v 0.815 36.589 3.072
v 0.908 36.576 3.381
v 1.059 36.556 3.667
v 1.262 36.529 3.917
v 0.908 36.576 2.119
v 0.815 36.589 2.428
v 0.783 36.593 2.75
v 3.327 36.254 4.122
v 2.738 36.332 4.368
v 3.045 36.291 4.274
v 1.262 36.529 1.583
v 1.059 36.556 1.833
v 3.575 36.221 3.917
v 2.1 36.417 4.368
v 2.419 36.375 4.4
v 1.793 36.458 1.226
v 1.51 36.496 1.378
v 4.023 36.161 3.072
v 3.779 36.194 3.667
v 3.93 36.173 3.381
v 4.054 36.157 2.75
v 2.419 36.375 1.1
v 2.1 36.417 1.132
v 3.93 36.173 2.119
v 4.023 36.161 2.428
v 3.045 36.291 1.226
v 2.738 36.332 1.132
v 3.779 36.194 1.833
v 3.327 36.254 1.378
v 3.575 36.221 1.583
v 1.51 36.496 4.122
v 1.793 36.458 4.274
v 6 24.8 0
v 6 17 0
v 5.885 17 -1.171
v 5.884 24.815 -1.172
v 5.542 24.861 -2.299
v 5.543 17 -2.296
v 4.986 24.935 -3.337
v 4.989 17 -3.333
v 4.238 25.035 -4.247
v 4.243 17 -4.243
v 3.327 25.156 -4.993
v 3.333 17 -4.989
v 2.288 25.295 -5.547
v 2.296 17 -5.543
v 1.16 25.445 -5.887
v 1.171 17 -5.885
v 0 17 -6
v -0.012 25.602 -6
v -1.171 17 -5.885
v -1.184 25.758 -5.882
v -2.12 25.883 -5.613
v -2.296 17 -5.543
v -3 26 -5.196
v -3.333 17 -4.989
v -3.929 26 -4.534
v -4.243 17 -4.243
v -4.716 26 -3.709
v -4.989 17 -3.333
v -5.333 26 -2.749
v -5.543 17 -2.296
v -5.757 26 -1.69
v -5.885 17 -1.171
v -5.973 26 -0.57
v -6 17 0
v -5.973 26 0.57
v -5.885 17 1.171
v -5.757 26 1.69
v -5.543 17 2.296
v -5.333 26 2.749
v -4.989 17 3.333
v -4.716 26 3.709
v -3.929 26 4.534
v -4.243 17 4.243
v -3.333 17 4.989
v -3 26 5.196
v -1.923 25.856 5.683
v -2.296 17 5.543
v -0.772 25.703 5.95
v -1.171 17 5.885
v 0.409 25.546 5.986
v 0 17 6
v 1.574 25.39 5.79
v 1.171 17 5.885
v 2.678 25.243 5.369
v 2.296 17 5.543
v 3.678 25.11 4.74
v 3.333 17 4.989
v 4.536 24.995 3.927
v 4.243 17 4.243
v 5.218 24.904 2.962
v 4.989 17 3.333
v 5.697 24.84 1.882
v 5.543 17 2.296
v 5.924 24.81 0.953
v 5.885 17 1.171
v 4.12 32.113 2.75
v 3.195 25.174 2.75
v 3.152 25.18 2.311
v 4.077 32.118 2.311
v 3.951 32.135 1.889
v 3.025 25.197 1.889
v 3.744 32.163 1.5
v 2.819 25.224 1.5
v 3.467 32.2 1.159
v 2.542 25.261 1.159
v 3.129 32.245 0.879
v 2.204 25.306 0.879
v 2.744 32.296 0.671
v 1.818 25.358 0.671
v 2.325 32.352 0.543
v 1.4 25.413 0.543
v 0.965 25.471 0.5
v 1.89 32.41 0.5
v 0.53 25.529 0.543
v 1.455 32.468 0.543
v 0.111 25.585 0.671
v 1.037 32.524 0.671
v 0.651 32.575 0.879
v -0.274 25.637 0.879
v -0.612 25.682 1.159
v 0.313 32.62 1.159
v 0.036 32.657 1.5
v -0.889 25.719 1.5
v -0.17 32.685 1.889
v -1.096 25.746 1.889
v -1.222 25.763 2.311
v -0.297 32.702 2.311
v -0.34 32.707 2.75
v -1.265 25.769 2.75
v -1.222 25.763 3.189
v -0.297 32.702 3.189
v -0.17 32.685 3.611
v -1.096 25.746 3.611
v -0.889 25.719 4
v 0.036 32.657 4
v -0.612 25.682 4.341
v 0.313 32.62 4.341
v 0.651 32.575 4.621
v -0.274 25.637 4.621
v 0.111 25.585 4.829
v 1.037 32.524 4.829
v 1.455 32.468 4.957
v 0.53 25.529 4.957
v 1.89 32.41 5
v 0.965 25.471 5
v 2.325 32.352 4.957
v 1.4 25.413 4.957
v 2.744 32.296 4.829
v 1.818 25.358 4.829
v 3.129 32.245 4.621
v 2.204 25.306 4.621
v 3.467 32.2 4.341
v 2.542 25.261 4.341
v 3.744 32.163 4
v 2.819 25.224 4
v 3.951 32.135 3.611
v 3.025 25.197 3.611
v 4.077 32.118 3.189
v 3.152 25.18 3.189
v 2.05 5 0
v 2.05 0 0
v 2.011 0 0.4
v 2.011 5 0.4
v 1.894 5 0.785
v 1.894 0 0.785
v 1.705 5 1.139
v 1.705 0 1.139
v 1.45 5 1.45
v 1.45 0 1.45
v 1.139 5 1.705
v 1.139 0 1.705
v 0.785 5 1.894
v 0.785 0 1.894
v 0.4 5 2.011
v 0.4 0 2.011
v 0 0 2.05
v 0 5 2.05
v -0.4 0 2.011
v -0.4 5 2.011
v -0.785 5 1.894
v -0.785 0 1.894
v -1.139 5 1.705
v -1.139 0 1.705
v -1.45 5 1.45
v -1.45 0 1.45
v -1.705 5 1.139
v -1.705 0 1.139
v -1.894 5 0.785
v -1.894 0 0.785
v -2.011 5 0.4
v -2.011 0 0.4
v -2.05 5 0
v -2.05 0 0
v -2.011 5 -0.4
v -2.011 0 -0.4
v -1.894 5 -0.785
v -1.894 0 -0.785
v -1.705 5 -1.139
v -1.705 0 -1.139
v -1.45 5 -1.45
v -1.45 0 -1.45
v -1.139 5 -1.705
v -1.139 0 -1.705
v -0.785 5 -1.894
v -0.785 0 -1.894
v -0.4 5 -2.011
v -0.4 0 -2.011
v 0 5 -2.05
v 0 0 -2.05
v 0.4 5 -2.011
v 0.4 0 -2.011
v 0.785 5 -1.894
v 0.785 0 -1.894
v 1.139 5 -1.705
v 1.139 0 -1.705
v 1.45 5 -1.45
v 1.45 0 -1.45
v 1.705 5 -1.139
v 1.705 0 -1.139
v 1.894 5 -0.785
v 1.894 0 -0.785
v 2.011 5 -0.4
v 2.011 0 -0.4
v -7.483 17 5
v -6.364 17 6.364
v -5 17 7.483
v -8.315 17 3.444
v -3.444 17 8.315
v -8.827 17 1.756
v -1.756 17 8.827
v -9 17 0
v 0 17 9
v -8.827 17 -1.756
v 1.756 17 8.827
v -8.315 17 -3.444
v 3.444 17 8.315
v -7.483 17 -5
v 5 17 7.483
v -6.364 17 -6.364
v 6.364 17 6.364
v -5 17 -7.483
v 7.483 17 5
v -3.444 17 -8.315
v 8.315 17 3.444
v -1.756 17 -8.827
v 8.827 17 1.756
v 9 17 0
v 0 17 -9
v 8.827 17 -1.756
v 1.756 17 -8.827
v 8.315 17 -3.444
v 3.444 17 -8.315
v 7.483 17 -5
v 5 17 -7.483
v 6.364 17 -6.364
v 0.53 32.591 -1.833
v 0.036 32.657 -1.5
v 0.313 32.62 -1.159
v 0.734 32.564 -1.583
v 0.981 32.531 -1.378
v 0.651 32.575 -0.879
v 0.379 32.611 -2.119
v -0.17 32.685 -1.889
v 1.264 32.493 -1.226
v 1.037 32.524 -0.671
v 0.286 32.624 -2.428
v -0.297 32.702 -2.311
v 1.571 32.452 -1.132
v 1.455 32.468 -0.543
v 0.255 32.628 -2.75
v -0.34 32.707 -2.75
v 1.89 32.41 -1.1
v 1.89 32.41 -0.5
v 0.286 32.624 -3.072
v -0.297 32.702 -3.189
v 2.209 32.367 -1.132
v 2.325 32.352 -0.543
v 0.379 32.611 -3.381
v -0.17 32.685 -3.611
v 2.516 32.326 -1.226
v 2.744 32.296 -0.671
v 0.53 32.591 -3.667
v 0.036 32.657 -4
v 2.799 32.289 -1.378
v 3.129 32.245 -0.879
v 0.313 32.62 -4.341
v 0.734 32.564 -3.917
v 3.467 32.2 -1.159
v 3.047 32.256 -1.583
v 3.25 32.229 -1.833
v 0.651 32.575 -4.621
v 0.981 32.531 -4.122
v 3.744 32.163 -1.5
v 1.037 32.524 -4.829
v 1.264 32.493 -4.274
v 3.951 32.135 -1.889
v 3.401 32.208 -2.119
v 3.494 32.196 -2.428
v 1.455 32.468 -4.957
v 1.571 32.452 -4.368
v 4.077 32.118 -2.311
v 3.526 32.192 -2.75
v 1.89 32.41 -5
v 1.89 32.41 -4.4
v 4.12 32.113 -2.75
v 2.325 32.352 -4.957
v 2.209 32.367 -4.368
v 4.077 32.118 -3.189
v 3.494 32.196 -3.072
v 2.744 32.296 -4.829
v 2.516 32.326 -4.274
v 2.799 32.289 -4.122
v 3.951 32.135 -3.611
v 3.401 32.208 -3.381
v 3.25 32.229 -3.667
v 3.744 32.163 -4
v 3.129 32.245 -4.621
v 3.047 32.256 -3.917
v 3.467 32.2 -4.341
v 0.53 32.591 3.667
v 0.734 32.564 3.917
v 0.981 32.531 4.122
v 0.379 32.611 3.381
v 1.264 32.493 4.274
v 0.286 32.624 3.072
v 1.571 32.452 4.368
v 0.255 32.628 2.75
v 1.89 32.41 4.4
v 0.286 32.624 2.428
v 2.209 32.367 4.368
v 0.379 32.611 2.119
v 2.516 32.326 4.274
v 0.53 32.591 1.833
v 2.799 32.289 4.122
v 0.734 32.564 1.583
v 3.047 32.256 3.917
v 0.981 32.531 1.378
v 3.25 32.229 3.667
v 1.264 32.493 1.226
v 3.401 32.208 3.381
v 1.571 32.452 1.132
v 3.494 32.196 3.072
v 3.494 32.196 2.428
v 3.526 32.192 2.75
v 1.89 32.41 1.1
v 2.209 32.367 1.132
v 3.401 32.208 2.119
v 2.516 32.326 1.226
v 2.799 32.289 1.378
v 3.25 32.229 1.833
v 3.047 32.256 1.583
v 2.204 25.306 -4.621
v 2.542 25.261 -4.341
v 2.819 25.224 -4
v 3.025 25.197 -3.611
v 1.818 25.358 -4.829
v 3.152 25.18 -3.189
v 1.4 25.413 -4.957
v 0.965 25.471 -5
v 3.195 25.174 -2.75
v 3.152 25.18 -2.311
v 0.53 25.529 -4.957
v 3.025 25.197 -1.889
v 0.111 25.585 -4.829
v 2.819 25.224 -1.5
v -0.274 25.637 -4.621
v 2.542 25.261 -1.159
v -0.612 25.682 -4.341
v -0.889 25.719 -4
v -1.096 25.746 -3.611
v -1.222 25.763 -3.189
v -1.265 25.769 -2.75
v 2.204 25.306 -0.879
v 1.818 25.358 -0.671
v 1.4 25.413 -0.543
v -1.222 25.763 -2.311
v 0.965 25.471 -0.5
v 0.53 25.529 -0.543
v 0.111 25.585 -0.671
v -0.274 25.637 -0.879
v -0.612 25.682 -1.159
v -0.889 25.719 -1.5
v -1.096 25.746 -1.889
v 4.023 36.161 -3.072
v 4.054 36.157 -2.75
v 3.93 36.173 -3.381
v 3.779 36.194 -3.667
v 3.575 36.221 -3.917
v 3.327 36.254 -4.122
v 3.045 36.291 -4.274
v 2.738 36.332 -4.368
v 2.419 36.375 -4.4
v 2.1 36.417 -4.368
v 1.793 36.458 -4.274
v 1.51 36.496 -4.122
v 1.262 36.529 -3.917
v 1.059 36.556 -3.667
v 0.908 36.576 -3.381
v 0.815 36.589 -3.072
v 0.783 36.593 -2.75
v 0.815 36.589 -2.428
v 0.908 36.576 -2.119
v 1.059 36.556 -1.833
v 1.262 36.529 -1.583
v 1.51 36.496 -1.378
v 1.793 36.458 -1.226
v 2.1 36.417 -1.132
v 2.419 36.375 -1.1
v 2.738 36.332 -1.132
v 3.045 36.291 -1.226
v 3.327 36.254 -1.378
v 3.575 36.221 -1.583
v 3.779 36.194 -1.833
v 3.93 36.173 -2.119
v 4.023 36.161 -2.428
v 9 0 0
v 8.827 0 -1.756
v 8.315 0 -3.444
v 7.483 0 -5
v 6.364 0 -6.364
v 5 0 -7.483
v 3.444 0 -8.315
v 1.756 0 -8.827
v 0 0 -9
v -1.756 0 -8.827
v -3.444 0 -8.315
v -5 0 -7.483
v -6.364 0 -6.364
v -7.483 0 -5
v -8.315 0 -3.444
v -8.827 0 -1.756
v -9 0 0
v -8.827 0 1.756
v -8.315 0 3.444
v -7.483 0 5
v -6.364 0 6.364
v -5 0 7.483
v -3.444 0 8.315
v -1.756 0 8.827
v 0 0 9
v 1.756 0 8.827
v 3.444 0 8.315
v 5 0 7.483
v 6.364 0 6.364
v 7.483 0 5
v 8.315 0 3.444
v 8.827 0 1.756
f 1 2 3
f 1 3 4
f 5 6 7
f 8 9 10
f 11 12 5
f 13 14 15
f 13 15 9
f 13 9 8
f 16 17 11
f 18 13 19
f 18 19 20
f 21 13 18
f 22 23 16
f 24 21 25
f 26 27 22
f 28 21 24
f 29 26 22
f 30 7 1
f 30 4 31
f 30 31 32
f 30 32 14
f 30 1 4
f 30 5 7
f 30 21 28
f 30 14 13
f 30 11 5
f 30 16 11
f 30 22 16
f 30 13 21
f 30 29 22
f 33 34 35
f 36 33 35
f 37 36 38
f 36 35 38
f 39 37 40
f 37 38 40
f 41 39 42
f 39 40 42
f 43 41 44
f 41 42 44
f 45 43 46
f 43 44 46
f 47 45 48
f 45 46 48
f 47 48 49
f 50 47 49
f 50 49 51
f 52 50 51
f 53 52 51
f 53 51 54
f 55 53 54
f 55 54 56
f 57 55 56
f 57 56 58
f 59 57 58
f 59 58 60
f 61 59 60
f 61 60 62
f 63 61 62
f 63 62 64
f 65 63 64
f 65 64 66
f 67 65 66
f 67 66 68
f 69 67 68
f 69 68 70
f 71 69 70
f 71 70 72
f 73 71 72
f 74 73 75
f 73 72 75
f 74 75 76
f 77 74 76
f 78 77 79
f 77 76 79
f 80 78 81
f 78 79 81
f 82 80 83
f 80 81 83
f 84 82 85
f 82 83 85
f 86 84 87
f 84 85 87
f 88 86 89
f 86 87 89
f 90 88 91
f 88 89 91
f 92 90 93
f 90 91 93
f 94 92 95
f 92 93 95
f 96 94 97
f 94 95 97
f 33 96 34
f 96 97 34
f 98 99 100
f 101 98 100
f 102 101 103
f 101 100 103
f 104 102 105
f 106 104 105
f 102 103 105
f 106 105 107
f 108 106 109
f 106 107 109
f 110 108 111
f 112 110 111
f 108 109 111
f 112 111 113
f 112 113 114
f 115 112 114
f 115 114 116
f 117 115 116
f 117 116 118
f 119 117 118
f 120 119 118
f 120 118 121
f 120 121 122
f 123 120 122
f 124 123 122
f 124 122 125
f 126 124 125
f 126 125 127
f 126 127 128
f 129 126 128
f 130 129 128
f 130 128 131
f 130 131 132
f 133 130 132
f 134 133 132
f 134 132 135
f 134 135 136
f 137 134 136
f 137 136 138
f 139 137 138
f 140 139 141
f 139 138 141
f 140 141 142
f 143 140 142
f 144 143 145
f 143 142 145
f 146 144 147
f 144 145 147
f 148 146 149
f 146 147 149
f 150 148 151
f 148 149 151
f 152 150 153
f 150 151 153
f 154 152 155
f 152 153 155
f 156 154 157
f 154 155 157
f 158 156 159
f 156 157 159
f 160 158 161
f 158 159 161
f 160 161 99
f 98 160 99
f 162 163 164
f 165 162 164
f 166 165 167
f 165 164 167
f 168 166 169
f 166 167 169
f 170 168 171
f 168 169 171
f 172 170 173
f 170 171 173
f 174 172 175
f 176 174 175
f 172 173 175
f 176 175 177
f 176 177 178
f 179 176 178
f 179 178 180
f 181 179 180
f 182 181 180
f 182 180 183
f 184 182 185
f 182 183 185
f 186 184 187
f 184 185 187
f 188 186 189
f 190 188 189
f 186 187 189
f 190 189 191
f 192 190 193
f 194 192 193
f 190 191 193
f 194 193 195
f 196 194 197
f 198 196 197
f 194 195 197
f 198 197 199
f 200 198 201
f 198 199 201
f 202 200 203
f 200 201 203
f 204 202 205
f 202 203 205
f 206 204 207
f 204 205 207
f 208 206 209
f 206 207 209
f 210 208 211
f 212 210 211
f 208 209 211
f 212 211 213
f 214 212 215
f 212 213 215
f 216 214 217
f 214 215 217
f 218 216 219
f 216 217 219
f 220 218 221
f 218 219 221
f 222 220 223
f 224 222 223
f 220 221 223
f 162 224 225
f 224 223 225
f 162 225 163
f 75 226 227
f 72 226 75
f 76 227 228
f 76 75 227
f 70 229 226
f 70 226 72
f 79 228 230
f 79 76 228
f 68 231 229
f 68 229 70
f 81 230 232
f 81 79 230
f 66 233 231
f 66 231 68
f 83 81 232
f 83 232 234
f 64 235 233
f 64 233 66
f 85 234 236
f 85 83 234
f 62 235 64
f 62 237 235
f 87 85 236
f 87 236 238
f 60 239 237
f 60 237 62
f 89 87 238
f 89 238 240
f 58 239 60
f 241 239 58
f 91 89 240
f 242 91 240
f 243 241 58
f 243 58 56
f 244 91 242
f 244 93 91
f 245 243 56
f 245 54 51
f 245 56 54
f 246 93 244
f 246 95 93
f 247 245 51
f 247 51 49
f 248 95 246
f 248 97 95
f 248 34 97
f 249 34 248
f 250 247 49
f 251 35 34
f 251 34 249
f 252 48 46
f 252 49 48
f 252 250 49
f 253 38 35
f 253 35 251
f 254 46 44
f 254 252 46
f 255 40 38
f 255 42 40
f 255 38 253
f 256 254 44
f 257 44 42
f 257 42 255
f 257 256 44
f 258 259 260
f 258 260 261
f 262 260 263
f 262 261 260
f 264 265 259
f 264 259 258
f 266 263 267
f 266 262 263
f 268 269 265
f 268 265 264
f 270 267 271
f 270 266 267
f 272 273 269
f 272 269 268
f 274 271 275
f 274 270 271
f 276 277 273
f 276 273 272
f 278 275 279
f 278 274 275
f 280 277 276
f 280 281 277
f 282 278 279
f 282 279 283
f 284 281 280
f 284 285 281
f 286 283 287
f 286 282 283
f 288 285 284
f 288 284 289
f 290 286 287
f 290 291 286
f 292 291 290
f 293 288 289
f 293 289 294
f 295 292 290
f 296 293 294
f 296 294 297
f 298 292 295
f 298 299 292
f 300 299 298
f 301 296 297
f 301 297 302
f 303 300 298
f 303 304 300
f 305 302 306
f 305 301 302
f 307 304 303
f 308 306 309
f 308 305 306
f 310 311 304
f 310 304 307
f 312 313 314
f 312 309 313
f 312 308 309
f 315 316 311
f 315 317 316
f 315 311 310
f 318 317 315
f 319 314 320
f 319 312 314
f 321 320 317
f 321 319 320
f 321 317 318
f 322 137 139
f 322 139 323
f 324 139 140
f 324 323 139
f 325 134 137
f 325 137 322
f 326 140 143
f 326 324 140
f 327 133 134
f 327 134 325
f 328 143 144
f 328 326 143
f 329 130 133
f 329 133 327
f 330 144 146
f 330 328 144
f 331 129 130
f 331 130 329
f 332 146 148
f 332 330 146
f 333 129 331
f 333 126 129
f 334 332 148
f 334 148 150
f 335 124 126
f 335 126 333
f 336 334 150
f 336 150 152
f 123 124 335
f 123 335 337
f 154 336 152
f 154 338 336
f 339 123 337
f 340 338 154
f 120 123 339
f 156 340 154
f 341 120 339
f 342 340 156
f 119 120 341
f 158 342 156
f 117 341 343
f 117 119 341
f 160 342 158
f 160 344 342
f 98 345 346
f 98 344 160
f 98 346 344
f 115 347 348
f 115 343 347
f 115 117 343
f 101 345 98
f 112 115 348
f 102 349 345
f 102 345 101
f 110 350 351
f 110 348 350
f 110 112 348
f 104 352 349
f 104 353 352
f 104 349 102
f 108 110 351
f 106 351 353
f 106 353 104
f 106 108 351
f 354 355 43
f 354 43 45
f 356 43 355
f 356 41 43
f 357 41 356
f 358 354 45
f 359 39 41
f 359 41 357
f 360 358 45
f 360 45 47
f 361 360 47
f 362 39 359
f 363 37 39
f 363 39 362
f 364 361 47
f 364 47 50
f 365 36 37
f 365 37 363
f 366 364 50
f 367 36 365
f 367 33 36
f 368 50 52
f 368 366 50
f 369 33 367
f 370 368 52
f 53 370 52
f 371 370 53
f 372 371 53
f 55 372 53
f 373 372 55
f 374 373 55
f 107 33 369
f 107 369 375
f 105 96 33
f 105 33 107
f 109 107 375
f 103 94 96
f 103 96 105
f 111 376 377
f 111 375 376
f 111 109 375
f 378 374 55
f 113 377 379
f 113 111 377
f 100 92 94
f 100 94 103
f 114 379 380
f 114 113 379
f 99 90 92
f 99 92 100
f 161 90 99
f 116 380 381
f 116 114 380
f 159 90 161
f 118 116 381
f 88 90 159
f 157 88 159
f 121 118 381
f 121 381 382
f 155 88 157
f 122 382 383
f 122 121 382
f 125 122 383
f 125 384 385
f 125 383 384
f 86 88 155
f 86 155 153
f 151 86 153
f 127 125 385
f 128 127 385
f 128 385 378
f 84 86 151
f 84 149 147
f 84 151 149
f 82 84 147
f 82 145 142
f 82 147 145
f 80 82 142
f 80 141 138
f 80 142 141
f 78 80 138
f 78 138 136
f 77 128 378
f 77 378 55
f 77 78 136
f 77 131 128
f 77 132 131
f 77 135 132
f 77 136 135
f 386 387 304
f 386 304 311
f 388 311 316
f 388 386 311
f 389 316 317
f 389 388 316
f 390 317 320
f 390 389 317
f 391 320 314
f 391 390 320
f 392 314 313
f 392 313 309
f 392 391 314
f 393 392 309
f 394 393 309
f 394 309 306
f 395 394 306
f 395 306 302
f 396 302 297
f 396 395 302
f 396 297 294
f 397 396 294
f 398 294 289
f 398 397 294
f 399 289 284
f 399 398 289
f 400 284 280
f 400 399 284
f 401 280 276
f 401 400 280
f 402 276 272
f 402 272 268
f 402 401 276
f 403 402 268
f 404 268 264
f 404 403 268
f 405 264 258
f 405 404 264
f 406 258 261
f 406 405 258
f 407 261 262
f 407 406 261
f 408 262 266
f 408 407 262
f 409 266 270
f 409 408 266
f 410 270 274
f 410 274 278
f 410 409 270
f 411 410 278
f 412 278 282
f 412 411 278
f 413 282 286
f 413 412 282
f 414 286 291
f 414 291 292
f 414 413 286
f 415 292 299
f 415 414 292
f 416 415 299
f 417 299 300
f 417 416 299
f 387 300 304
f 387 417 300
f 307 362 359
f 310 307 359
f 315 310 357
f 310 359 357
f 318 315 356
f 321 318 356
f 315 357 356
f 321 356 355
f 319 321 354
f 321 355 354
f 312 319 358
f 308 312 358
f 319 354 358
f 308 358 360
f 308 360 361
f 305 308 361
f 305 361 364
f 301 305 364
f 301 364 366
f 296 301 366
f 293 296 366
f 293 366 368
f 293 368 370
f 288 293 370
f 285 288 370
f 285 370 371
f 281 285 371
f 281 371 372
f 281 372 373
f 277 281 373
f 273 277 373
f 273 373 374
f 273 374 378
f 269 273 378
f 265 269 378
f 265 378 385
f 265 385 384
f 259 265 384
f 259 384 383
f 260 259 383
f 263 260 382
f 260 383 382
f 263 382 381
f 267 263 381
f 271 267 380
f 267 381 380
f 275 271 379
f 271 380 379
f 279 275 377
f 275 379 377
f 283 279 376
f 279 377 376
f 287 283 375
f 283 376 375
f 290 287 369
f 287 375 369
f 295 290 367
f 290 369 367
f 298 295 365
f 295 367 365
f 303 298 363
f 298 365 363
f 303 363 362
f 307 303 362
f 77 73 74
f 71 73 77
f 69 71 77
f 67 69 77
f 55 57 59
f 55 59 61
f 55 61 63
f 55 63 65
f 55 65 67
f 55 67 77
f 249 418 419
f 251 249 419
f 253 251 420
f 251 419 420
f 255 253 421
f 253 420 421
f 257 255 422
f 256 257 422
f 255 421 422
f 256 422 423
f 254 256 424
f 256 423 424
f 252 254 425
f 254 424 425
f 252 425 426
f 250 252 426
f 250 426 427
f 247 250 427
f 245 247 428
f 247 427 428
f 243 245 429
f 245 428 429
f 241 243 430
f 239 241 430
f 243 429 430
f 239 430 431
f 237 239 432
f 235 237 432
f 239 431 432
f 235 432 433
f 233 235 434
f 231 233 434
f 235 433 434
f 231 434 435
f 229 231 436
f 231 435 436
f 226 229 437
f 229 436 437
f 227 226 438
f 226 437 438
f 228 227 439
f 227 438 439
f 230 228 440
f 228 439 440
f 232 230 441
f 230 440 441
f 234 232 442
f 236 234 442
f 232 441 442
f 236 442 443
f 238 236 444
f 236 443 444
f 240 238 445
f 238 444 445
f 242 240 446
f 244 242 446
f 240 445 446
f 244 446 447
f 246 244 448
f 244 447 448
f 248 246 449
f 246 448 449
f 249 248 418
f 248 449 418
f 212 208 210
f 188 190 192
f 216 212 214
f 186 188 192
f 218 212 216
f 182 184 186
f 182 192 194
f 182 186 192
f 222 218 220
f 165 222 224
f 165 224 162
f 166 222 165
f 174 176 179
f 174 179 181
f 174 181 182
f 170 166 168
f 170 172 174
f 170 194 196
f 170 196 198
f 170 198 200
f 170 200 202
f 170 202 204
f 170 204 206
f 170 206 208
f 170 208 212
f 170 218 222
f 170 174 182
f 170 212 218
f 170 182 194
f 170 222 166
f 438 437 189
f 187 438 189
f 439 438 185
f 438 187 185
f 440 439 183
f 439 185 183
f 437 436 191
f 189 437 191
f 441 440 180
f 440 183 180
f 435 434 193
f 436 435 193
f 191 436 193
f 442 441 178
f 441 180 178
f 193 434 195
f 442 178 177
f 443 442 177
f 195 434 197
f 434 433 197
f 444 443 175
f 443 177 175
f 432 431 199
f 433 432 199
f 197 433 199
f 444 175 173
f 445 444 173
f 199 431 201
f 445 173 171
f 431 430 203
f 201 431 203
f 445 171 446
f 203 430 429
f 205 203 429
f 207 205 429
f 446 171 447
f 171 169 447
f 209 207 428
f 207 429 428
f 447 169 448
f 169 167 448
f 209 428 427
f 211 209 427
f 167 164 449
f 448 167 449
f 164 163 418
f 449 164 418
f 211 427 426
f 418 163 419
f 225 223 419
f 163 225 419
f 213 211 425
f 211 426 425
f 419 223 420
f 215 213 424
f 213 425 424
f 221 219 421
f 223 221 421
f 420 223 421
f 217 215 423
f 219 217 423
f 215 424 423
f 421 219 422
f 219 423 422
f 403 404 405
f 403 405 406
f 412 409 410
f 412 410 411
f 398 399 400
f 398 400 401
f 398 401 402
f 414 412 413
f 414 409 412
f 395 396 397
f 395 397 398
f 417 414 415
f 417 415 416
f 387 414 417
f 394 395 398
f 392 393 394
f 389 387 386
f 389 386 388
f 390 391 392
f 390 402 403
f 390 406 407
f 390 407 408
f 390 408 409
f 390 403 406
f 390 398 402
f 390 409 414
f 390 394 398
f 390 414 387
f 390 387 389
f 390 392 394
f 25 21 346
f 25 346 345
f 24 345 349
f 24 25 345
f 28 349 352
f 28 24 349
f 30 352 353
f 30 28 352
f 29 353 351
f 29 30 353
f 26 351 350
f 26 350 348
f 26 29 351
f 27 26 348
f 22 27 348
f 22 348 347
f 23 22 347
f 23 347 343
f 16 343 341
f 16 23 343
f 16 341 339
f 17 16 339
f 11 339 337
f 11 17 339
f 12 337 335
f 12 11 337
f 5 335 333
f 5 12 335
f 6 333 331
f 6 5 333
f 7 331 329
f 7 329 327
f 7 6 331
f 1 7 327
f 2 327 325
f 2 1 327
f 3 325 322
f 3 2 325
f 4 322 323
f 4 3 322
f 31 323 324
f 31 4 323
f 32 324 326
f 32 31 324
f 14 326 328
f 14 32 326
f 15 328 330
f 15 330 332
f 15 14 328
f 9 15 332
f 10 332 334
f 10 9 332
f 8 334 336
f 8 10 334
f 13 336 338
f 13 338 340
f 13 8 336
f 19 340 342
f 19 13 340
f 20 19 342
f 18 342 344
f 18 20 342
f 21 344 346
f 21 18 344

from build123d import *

# Parameters (mm, degrees)
SKETCH1_R           = 9
BOSS_EXTRUDE1_DEPTH = 17
SKETCH2_R           = 6
BOSS_EXTRUDE2_DEPTH = 9
CUT_EXTRUDE1_DEPTH  = 8.5
SKETCH4_R           = 2.25
BOSS_EXTRUDE3_DEPTH = 11
SKETCH5_R           = 2.25
SKETCH5_R_2         = 1.65
CUT_EXTRUDE2_DEPTH  = 4
SKETCH6_R           = 2.05
CUT_EXTRUDE3_DEPTH  = 5


with BuildPart() as part:
    # Sketch1 → Boss-Extrude1 (new body)
    with BuildSketch(Plane(origin=(0, 0, 0), x_dir=(1, 0, 0), z_dir=(0, 1, 0))):
        Circle(SKETCH1_R)
    extrude(amount=BOSS_EXTRUDE1_DEPTH)

    # Sketch2 → Boss-Extrude2 (add)
    with BuildSketch(Plane(origin=(0, 17, 0), x_dir=(1, 0, 0), z_dir=(0, 1, 0))):
        Circle(SKETCH2_R)
    extrude(amount=BOSS_EXTRUDE2_DEPTH)

    # Sketch3 → Cut-Extrude1 (cut, symmetric)
    with BuildSketch(Plane.XY):
        Polygon((-3, 26), (6, 26), (6, 24.8), align=None)
    extrude(amount=CUT_EXTRUDE1_DEPTH, both=True, mode=Mode.SUBTRACT)

    # Sketch4 → Boss-Extrude3 (add)
    with BuildSketch(Plane(origin=(3.35371179, 25.152838428, 0), x_dir=(0.991227901, -0.13216372, 0), z_dir=(0.13216372, 0.991227901, 0))):
        with Locations((-2.409940424, 2.75)):
            Circle(SKETCH4_R)
        with Locations((-2.409940424, -2.75)):
            Circle(SKETCH4_R)
    extrude(amount=BOSS_EXTRUDE3_DEPTH)

    # Sketch5 → Cut-Extrude2 (cut)
    with BuildSketch(Plane(origin=(4.807512711, 36.056345335, 0), x_dir=(0.991227901, -0.13216372, 0), z_dir=(0.13216372, 0.991227901, 0))):
        with Locations((-2.409940424, 2.75)):
            Circle(SKETCH5_R)
        with Locations((-2.409940424, 2.75)):
            Circle(SKETCH5_R_2, mode=Mode.SUBTRACT)
        with Locations((-2.409940424, -2.75)):
            Circle(SKETCH5_R)
        with Locations((-2.409940424, -2.75)):
            Circle(SKETCH5_R_2, mode=Mode.SUBTRACT)
    extrude(amount=-CUT_EXTRUDE2_DEPTH, mode=Mode.SUBTRACT)

    # Sketch6 → Cut-Extrude3 (cut)
    with BuildSketch(Plane.XZ):
        Circle(SKETCH6_R)
    extrude(amount=-CUT_EXTRUDE3_DEPTH, mode=Mode.SUBTRACT)


solid = part.part
